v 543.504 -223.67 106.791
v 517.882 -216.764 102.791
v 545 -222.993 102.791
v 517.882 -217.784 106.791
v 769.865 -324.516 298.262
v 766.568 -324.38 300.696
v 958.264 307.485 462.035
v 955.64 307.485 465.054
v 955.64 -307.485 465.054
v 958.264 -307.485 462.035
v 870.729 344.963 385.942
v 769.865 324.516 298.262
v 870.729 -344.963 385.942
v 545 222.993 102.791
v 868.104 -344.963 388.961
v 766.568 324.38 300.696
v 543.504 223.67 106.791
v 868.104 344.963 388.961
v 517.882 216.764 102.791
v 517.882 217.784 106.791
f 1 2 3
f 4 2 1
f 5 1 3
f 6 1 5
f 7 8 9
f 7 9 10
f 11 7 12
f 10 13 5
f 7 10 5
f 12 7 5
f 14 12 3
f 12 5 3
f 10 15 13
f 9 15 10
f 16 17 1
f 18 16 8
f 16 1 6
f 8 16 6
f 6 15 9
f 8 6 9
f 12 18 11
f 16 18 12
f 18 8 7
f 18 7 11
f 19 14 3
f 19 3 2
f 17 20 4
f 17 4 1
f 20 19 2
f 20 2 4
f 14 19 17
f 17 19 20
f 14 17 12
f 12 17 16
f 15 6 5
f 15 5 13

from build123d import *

# Parameters (mm, degrees)
WYCI_GNI_CIE_CIENKA_CIANKA1_DEPTH      = 400
WYCI_GNI_CIE_CIENKA_CIANKA1_DEPTH_BACK = 400
LUSTRO1_START                          = 275.975094607
LUSTRO1_DEPTH                          = 4


# Read off the part's stored shape, not the designer's step: Lustro1
with BuildPart() as part:
    # Szkic1 → Wyciągnięcie-cienka ścianka1 (new, two sides: drawn at the far end of the back side and taken through both)
    with BuildSketch(Plane(origin=(0, 0, 0), x_dir=(1, 0, 0), z_dir=(0, 1, 0)).offset(-WYCI_GNI_CIE_CIENKA_CIANKA1_DEPTH_BACK)):
        Polygon((958.263871938, -462.035437036), (545, -102.790633942), (517.881642578, -102.790633942), (517.881642578, -106.790633942), (543.504461282, -106.790633942), (955.639635822, -465.054275357), align=None)
    extrude(amount=WYCI_GNI_CIE_CIENKA_CIANKA1_DEPTH + WYCI_GNI_CIE_CIENKA_CIANKA1_DEPTH_BACK)

    # Cięcie powierzchnią3
    split(bisect_by=Plane(origin=(-14.708403282, 64.029657214, -16.335336758), x_dir=(0.6328754019355285, 0.32469887066665293, 0.7028793417171568), z_dir=(0.2172659522131463, -0.9458174471787886, 0.2412982855743377)), keep=Keep.TOP)

    # Cięcie powierzchnią4
    split(bisect_by=Plane(origin=(-14.708403282, -64.029657214, -16.335336758), x_dir=(0.6328754019353329, -0.32469887066665304, 0.7028793417173329), z_dir=(-0.21726595221314635, -0.9458174471787884, -0.24129828557433775)), keep=Keep.BOTTOM)

    # Cięcie powierzchnią5
    split(bisect_by=Plane(origin=(141.124135037, -578.697205105, 122.677338974), x_dir=(0.718149384400474, 0.30747157670526803, 0.6242777356302215), z_dir=(0.2320517445856664, -0.9515572654960797, 0.20171950405543876)), keep=Keep.BOTTOM)

    # Cięcie powierzchnią6
    split(bisect_by=Plane(origin=(-23.206221207, -200.985361995, -20.17286033), x_dir=(0.74602943431762, -0.15122940248105377, 0.6485134932728503), z_dir=(-0.11413427886381658, -0.9884986938915112, -0.09921541494653495)), keep=Keep.BOTTOM)

    # Lustro1 outline → Lustro1 (cut)
    with BuildSketch(Plane(origin=(0, 0, 0), x_dir=(0.754709580222771, 0, 0.6560590289905084), z_dir=(0.6560590289905085, 0, -0.7547095802227708)).offset(LUSTRO1_START)):
        Polygon((1026.333444714, -307.485100364), (910.348198503, -344.962788591), (775.810550903, -324.380011716), (774, -324.103017388), (774, -400), (1026.333444714, -400), align=None)
    extrude(amount=LUSTRO1_DEPTH, mode=Mode.SUBTRACT)


solid = part.part
